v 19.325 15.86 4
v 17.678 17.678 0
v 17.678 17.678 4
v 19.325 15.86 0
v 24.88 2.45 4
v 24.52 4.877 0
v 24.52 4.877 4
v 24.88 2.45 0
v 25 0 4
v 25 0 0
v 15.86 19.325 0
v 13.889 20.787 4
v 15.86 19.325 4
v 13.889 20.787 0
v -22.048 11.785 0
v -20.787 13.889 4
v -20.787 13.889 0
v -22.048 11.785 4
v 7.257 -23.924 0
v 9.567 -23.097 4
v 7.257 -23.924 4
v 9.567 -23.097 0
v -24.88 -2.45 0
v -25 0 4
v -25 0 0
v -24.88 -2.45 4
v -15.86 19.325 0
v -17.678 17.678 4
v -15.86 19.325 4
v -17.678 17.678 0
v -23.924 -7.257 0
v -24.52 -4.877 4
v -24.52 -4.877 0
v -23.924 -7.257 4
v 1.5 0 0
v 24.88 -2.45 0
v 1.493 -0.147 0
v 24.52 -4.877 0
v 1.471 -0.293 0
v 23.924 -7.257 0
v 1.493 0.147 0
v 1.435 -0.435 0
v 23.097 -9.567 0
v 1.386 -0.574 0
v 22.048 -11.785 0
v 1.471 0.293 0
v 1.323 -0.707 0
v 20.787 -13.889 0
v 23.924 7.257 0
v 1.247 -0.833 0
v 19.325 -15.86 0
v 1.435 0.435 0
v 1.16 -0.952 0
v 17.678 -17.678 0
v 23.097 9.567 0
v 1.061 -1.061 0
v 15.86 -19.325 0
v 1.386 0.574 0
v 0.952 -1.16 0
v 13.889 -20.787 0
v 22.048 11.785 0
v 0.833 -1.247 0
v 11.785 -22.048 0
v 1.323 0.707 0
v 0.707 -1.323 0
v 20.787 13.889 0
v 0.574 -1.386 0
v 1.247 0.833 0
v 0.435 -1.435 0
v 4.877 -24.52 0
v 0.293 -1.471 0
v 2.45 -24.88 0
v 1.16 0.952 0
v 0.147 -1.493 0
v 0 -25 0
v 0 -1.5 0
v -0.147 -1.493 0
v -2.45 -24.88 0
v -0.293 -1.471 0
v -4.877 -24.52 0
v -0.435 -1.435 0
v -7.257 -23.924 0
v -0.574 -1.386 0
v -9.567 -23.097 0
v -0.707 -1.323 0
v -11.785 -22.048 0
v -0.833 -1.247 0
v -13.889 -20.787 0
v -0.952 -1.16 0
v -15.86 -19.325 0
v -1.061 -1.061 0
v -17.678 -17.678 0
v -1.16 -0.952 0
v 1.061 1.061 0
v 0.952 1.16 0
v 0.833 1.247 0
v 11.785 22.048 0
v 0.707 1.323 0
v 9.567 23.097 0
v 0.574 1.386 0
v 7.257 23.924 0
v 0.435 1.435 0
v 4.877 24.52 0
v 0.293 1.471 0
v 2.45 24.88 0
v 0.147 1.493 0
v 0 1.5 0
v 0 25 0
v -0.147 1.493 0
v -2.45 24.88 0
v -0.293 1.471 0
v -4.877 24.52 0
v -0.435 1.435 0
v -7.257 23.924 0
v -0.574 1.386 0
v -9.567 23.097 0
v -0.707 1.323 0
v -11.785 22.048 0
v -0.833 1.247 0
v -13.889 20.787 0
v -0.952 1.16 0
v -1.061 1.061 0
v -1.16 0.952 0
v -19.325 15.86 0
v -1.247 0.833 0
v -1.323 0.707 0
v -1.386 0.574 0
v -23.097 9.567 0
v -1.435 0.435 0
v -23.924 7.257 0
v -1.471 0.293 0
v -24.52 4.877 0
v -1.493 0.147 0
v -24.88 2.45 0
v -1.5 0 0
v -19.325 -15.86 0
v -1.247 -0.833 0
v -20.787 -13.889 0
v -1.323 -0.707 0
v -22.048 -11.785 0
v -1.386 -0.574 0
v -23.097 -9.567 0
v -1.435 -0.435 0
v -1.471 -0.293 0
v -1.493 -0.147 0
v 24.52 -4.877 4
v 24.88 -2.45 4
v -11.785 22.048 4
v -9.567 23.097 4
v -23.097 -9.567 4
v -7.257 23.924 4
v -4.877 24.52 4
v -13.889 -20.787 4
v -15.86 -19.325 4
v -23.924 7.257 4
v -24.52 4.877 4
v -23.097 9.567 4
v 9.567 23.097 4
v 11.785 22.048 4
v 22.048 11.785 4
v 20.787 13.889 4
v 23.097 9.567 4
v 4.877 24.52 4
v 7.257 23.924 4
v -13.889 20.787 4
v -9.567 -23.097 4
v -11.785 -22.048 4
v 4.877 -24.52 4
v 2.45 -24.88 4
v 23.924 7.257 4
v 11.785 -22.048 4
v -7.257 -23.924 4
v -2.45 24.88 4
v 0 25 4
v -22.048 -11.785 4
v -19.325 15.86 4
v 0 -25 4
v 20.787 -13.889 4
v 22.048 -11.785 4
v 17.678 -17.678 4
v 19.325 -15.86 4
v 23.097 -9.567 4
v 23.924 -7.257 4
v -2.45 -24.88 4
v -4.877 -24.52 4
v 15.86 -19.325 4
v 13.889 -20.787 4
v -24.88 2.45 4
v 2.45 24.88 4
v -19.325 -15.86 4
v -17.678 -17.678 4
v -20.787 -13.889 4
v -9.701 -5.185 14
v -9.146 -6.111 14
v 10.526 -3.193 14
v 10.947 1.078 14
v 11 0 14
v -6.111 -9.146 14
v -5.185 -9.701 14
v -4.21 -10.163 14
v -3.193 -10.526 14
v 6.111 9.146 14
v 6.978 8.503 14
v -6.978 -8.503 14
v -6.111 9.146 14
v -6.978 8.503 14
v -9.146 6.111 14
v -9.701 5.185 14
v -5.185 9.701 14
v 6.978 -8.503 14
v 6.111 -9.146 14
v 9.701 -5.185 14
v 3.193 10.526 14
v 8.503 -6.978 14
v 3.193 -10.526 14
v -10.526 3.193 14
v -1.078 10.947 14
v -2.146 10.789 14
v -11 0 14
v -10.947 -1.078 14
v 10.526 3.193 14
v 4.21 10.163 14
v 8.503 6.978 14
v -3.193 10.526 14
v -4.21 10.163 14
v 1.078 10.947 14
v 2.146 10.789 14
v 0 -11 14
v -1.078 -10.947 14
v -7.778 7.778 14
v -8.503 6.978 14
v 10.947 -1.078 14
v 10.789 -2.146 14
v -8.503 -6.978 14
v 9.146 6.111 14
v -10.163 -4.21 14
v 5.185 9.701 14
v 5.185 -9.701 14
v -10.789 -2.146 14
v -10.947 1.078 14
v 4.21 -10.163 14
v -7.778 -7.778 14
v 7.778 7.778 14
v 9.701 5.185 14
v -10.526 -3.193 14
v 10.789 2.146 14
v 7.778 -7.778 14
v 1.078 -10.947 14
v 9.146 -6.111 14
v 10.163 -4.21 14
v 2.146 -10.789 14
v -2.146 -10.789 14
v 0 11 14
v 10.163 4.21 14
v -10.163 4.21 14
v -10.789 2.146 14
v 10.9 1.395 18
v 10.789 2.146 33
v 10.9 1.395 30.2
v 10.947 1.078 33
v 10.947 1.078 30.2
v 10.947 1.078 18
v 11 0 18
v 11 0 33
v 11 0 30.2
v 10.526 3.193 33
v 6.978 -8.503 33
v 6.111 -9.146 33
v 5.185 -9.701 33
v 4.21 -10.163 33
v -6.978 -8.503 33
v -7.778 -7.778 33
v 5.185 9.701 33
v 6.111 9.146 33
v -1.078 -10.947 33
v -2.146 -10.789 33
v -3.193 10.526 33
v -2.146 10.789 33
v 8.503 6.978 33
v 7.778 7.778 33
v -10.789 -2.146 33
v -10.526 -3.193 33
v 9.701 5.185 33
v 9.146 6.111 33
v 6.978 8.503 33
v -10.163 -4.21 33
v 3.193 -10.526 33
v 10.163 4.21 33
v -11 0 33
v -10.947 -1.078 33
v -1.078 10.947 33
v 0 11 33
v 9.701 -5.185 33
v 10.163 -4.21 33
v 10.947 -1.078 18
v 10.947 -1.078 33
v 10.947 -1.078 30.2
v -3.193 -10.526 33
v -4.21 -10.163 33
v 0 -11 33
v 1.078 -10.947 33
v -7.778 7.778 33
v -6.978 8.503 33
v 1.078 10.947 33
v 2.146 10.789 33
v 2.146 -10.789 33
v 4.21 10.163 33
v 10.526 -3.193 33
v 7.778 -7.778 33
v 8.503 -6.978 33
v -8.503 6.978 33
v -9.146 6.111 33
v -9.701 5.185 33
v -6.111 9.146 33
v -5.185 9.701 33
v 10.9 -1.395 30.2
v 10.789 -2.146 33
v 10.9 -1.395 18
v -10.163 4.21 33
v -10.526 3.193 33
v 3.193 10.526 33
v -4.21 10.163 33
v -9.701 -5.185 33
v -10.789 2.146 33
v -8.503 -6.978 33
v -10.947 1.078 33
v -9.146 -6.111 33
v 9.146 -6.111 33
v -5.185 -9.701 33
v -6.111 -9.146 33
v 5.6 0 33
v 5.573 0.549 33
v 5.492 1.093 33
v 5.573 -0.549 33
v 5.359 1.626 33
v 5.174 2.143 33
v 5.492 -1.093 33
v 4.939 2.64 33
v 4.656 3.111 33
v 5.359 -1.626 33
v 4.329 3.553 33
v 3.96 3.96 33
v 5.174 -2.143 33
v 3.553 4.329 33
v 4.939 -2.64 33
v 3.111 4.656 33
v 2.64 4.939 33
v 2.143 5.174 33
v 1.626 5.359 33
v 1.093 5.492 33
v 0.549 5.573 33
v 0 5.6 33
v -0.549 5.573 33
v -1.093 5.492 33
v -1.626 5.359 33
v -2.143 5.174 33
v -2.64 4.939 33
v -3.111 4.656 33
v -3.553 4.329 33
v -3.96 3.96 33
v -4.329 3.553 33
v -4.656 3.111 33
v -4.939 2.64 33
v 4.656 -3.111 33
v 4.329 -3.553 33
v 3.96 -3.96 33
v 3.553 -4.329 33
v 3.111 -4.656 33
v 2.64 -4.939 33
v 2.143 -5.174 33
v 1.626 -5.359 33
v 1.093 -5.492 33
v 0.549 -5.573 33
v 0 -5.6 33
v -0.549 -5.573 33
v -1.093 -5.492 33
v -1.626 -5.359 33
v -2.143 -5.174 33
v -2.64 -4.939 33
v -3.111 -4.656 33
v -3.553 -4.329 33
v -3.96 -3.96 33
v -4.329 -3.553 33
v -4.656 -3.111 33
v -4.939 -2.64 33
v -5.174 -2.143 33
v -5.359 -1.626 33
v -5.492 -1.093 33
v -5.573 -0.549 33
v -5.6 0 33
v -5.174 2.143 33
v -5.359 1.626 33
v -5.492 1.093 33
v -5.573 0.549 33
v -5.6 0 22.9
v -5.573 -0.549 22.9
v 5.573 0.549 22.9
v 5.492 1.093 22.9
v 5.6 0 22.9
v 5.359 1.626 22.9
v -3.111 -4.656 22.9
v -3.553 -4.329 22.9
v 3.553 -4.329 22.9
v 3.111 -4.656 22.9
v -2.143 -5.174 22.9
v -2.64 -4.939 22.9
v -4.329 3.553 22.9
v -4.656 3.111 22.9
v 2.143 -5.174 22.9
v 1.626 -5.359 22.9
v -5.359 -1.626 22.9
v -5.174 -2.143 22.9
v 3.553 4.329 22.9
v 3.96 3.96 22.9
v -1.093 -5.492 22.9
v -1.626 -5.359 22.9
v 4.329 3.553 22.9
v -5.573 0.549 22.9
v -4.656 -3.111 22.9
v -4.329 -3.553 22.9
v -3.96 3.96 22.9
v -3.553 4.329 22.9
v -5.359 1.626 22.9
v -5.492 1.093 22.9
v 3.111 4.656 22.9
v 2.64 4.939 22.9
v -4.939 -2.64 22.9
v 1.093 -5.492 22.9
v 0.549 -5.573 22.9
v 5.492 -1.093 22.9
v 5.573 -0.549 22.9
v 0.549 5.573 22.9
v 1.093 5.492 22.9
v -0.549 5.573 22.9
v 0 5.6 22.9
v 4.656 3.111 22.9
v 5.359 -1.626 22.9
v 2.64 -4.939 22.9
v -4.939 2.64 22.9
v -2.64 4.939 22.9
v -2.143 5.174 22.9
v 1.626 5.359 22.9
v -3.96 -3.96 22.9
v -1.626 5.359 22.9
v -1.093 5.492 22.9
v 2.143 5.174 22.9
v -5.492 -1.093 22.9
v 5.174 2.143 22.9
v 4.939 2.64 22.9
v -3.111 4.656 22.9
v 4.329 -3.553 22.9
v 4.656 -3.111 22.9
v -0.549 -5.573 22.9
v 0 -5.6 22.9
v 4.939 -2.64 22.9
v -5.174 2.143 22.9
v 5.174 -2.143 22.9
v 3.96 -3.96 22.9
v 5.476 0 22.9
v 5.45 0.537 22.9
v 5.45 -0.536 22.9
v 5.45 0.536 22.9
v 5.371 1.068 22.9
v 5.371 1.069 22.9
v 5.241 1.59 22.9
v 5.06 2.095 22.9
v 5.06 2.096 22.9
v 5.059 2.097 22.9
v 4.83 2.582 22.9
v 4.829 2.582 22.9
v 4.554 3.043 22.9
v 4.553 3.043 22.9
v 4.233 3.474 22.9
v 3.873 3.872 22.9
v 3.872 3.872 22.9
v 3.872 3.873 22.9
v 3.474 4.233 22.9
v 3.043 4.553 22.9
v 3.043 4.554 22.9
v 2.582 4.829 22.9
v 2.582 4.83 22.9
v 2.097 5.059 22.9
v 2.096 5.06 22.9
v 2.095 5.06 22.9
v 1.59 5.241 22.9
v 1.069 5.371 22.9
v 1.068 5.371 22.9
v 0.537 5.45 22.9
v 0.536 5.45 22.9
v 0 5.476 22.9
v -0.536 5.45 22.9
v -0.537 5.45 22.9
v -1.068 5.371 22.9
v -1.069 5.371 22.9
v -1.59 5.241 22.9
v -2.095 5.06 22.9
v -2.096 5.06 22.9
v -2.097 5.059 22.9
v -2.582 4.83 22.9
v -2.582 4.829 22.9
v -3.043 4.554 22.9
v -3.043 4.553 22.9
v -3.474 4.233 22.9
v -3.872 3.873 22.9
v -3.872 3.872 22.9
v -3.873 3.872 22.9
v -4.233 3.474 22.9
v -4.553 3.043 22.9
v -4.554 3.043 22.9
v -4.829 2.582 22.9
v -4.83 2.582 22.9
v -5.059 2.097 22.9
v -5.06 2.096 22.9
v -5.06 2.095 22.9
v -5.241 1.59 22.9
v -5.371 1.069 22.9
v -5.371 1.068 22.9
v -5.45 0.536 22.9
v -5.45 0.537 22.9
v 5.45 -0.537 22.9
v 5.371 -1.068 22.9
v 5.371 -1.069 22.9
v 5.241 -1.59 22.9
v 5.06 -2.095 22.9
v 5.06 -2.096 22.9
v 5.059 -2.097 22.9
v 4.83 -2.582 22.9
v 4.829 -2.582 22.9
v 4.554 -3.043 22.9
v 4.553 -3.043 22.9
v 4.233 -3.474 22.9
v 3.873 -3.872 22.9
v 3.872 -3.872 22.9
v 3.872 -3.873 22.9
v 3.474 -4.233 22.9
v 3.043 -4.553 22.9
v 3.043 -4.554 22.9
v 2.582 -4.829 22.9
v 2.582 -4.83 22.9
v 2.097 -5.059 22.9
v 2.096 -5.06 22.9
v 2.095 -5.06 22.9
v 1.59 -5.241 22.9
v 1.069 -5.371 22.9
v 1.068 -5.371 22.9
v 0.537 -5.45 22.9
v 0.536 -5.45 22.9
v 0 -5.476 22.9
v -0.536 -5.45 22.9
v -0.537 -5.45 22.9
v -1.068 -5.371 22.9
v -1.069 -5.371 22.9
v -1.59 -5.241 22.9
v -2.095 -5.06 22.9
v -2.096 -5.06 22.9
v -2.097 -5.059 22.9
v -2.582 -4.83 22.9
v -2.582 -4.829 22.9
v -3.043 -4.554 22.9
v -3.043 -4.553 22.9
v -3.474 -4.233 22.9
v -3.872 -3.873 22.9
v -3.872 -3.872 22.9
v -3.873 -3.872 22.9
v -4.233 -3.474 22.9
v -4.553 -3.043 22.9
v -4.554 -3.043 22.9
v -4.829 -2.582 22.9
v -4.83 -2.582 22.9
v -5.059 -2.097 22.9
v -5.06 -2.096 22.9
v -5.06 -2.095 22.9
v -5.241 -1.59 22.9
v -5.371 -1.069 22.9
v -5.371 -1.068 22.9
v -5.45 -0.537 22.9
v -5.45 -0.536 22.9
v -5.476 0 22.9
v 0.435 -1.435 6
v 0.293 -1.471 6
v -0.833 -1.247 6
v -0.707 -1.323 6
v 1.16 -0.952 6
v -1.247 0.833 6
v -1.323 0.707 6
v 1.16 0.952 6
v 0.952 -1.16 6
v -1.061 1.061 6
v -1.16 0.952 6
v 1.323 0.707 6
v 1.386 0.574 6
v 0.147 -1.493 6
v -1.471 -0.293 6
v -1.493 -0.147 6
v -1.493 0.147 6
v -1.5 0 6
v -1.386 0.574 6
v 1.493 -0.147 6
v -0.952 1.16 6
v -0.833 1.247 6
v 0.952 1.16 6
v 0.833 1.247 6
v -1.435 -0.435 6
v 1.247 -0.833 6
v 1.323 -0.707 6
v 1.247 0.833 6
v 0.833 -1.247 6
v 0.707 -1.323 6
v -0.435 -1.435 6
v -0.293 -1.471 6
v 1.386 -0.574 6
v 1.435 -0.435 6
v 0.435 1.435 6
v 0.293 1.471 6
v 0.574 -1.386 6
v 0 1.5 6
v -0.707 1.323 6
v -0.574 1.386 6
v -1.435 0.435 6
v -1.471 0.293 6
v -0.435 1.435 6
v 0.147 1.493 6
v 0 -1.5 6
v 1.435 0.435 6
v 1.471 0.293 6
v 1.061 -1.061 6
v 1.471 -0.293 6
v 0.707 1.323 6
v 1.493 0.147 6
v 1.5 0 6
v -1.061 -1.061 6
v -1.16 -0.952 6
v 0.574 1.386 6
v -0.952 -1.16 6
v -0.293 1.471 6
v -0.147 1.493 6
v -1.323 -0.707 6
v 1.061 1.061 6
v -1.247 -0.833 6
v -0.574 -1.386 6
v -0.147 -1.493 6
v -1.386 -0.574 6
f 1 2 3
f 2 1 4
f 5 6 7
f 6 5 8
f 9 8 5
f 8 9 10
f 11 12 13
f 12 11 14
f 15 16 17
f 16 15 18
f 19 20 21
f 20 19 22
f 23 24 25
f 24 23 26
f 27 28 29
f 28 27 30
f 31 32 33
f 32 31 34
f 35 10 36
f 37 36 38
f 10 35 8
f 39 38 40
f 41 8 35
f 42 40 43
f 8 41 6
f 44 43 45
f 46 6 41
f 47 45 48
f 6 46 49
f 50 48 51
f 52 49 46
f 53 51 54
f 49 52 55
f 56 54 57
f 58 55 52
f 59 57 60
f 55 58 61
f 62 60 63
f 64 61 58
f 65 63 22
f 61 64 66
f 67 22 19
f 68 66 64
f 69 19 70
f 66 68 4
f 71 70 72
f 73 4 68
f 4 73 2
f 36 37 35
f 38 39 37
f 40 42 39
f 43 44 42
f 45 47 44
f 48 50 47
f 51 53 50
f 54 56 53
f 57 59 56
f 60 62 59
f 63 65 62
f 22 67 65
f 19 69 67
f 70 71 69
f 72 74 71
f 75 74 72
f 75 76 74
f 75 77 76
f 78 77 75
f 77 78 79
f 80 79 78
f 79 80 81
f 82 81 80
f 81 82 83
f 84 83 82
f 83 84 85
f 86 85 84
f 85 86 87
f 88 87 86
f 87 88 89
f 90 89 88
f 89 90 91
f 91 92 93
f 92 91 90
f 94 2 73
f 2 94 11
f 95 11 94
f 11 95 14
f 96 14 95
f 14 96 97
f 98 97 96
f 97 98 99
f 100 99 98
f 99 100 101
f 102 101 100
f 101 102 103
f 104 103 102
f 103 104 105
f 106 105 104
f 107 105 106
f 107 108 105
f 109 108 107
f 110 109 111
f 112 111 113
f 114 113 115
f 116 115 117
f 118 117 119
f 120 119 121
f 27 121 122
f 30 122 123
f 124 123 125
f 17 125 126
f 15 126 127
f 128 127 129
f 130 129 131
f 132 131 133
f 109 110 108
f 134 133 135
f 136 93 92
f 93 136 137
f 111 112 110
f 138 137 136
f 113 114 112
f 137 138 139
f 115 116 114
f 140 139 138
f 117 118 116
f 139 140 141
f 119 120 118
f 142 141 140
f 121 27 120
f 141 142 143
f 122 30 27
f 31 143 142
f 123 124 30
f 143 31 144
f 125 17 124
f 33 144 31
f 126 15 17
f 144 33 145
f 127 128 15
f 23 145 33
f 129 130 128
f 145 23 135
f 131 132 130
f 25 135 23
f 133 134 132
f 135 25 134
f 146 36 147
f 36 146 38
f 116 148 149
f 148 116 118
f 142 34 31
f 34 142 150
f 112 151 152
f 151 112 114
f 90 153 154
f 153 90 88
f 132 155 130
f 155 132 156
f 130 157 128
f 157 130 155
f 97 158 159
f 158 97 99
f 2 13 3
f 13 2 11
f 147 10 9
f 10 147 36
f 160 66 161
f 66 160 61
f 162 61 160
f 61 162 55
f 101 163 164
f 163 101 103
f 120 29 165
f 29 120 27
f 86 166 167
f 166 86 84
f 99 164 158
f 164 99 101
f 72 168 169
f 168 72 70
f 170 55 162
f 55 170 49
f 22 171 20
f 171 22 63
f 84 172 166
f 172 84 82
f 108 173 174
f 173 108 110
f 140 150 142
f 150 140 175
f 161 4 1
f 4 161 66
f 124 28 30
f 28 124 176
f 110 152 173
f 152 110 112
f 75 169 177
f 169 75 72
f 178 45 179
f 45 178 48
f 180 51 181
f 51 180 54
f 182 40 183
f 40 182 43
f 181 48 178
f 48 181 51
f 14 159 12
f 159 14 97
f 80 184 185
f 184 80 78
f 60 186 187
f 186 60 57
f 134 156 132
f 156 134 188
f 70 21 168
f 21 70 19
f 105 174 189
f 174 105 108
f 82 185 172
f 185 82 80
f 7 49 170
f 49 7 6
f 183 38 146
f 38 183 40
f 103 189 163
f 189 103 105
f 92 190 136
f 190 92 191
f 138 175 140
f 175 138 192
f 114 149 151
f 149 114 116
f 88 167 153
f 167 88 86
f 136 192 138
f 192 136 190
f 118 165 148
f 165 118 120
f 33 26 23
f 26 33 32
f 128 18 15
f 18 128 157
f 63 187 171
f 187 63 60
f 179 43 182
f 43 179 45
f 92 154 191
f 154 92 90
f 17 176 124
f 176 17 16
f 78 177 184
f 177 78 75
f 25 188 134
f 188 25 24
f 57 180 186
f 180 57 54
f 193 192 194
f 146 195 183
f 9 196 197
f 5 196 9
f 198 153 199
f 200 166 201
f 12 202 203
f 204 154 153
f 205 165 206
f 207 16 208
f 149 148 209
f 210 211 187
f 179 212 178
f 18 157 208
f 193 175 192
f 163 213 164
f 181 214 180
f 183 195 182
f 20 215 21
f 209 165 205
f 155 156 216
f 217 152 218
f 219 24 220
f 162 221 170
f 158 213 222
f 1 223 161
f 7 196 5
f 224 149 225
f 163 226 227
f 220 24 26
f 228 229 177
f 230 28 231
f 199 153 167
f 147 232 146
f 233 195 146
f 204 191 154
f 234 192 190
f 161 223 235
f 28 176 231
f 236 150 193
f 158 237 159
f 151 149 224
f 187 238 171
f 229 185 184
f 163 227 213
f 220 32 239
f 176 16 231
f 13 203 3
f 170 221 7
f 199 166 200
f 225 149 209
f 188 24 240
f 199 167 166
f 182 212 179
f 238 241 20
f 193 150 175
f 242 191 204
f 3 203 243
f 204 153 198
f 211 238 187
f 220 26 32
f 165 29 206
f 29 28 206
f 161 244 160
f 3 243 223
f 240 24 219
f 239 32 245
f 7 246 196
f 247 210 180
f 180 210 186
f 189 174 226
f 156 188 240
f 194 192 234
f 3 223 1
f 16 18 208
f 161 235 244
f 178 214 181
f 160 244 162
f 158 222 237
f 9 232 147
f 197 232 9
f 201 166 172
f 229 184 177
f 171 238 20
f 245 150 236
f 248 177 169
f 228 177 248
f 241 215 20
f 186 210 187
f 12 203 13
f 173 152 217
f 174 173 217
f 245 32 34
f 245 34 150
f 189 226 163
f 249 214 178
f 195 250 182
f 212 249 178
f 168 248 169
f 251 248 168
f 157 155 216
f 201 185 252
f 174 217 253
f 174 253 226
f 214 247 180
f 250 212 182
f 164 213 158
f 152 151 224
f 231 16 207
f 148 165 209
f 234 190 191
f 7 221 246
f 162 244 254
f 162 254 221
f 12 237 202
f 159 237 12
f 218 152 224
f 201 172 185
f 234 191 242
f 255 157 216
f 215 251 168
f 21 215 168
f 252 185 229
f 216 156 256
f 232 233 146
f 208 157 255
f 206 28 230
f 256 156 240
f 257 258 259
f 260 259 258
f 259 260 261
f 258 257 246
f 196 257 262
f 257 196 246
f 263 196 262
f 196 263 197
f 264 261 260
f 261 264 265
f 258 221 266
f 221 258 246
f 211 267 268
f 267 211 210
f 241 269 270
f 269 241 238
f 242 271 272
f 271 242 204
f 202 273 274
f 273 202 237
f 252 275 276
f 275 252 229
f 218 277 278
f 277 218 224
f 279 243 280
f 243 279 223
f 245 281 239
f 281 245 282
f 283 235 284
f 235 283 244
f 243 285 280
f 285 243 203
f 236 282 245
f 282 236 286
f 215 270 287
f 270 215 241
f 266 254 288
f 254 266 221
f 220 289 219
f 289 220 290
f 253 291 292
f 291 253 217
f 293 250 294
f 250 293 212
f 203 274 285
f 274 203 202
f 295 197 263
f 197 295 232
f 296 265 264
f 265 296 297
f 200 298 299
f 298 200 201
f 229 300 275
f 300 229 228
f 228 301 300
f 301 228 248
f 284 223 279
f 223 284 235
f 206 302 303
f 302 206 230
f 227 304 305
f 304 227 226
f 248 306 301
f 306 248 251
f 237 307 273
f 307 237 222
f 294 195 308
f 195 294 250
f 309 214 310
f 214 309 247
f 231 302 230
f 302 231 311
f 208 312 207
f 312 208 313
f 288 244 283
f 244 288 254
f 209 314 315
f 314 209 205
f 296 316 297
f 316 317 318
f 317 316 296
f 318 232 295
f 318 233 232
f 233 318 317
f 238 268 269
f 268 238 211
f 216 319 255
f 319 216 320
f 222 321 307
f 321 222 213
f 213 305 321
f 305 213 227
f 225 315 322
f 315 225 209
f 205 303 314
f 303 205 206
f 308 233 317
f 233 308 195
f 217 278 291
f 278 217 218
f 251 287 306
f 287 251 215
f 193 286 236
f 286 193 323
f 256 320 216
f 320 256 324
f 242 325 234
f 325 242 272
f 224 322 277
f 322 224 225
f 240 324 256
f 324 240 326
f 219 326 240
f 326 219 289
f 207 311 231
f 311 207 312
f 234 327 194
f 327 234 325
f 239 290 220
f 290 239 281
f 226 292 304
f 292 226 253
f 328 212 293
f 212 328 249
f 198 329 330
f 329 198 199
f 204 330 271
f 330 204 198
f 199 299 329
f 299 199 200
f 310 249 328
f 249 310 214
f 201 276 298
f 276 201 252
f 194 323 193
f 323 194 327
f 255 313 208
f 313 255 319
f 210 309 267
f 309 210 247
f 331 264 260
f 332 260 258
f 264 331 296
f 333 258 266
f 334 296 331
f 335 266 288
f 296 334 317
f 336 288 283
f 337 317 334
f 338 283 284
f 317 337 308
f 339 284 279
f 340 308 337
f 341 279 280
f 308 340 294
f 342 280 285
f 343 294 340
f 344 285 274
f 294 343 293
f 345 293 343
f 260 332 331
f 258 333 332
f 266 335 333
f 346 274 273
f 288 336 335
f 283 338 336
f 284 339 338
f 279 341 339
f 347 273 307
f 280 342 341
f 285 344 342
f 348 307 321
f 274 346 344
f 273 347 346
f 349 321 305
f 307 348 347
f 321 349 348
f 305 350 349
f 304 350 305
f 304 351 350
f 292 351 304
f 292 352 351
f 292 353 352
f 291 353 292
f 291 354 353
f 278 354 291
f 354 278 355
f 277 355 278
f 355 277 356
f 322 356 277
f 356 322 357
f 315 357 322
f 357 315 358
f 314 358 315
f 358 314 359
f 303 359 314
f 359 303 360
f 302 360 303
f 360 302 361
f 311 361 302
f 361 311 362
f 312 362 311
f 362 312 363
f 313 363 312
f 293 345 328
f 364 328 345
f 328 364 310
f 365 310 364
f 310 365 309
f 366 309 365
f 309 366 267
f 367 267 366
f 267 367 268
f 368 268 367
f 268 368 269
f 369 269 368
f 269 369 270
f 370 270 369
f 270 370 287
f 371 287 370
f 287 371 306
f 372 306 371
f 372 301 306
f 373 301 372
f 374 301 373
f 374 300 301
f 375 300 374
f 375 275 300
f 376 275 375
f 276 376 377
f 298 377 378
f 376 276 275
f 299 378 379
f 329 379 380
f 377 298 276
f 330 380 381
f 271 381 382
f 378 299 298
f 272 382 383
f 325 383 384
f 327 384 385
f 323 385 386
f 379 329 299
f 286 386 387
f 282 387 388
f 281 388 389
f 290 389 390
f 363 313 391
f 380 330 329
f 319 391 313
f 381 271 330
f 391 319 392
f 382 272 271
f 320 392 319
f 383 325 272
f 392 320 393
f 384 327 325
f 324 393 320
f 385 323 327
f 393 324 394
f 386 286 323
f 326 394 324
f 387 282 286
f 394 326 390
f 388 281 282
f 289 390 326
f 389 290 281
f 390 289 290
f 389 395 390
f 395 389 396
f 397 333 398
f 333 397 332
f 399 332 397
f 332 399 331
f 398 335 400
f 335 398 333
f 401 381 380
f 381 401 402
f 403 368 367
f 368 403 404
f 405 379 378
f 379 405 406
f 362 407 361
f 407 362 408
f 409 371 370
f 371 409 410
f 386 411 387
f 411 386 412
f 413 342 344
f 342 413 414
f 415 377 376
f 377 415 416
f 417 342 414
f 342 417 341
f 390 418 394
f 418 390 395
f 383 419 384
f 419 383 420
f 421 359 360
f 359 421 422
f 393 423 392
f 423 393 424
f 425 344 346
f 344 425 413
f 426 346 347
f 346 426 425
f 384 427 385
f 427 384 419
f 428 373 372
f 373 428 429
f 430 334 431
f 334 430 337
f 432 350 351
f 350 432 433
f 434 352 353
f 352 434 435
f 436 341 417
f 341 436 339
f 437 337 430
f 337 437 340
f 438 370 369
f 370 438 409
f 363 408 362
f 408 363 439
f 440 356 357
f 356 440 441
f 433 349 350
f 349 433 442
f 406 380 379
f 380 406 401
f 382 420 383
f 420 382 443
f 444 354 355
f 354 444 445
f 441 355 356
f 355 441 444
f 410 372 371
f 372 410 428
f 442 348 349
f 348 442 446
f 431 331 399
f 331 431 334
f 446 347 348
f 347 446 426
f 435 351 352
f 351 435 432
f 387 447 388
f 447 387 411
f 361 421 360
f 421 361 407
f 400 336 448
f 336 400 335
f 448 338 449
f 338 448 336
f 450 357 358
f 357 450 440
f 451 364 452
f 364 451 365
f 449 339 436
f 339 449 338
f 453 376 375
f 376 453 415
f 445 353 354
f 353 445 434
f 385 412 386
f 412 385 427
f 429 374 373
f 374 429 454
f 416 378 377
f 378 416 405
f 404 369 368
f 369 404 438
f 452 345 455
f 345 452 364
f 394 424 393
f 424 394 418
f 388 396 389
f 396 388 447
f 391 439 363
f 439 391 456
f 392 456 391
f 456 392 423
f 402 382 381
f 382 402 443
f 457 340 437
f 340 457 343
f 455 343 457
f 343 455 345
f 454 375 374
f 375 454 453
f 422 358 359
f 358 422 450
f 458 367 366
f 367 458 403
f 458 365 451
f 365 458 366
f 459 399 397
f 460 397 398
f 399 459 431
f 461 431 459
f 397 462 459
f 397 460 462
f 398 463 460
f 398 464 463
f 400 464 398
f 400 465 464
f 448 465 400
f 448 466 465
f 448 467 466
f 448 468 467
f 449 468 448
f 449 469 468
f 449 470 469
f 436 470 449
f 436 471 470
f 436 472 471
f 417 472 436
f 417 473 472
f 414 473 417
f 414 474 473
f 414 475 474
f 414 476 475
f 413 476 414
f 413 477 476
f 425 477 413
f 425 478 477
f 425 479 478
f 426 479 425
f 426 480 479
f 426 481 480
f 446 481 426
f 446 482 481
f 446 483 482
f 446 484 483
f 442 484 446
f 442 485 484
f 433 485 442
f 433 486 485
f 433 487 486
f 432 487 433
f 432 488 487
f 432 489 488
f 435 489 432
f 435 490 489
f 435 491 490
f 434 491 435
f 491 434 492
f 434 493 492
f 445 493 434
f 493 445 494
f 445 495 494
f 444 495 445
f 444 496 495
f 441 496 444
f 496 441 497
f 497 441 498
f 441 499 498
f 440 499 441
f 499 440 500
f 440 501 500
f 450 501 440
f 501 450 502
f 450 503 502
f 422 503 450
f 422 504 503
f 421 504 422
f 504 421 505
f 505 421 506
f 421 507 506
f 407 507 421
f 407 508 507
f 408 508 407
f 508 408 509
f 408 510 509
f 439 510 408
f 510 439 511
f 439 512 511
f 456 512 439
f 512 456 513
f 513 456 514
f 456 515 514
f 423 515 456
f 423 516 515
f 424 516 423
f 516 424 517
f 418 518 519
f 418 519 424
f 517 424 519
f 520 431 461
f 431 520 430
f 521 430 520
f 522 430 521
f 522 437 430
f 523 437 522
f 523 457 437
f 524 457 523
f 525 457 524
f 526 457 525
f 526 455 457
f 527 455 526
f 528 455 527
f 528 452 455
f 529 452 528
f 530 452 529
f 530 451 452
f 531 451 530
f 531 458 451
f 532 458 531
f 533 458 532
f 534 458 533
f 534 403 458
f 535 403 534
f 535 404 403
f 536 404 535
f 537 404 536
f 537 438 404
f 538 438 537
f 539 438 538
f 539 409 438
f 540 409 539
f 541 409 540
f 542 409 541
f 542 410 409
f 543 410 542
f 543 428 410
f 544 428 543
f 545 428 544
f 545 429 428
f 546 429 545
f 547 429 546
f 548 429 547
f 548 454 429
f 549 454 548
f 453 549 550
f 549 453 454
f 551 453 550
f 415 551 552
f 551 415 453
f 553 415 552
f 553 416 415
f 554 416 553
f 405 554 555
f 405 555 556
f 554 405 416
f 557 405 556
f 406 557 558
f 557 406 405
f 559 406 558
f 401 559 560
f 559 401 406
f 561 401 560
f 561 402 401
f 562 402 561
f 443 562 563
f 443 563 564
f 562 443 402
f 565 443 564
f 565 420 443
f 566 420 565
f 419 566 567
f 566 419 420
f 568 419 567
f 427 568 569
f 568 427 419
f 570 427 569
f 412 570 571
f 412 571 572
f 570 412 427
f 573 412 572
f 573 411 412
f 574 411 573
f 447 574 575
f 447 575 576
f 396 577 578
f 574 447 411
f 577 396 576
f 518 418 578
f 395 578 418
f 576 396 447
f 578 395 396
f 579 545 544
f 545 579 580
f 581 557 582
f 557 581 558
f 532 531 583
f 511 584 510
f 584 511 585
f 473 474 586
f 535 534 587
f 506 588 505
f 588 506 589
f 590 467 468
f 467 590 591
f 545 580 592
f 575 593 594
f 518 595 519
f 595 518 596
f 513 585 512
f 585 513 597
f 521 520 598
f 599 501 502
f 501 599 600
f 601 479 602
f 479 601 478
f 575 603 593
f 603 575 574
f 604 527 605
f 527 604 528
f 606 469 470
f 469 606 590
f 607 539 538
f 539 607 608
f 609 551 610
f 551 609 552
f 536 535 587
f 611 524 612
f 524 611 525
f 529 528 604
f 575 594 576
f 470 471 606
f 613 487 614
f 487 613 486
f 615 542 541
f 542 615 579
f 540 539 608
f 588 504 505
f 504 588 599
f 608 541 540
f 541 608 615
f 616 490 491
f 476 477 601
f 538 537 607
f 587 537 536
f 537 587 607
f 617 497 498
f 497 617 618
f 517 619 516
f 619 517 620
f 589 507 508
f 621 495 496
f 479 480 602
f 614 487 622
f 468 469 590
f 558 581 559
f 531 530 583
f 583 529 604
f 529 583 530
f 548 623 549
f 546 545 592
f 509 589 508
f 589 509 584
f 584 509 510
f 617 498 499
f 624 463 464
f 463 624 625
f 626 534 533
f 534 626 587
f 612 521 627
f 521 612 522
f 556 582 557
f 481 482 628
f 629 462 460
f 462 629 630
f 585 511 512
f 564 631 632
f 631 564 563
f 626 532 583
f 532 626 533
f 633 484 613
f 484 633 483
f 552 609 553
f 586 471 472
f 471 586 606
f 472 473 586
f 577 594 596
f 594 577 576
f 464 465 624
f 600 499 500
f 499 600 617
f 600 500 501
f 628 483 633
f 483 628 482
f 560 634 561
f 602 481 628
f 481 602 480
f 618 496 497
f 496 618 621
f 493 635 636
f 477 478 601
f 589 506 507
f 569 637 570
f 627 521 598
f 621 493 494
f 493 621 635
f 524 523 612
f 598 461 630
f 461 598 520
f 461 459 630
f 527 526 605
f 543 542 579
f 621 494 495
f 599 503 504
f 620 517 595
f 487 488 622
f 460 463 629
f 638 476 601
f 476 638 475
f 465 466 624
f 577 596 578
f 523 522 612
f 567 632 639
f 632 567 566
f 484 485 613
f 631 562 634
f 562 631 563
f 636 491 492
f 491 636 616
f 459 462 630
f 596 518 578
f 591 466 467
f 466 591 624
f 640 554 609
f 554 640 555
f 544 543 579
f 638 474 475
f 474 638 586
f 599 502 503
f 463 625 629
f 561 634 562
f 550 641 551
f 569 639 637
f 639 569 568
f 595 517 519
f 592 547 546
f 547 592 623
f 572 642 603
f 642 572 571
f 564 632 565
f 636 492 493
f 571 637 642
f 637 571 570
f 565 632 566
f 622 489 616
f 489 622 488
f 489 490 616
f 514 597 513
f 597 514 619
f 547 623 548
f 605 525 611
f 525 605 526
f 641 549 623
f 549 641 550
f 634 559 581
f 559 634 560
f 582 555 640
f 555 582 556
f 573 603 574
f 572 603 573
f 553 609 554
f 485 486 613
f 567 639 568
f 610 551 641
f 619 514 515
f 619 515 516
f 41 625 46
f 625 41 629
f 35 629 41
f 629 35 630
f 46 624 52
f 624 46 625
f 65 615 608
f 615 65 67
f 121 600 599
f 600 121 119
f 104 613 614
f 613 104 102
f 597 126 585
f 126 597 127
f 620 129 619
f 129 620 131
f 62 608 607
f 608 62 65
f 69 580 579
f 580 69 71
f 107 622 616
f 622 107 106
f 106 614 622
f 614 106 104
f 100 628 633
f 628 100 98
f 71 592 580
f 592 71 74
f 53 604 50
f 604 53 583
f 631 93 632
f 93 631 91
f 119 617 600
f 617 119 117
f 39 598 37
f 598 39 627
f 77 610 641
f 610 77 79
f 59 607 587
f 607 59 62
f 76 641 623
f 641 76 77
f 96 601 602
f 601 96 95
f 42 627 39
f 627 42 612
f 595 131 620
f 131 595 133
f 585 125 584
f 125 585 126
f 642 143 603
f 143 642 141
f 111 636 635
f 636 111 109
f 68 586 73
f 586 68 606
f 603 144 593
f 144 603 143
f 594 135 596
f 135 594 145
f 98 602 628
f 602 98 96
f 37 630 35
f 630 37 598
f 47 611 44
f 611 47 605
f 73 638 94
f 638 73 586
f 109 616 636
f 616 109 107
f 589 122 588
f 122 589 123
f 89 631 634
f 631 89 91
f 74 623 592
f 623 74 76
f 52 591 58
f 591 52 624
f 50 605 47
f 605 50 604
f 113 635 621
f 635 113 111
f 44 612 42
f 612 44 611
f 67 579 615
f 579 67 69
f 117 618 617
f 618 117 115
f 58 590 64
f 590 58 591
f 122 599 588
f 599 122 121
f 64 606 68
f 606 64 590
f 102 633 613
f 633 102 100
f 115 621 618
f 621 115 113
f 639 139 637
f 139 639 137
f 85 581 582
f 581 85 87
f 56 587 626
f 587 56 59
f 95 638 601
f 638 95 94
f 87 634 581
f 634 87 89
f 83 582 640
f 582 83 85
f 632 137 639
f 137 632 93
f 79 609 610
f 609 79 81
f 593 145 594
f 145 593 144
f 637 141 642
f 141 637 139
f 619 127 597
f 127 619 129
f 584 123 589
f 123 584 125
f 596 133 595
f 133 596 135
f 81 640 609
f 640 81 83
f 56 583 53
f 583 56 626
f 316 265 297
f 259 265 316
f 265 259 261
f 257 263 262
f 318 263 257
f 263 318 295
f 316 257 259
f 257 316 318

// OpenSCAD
// --- Dimensions ---
base_diameter = 50.0;      // Diameter of the base disc
base_height = 4.0;         // Height of the base disc
cone_bottom_dia = 50.0;    // Diameter at the bottom of the cone (z=4)
cone_top_dia = 22.0;       // Diameter at the top of the cone (z=14)
cone_height = 10.0;        // Height of the cone section (14 - 4)
column_diameter = 22.0;     // Diameter of the top column
column_height = 19.0;      // Height of the column (33 - 14)
total_height = 33.0;       // Total height of the object

tube_seat_dia = 11.0;      // Diameter of the cylindrical part of the seat
seat_cyl_depth = 10.0;     // Depth of the cylindrical seat (33 - 23)
seat_cone_top_dia = 11.0;  // Diameter at the top of the seat cone (z=23)
seat_cone_bottom_dia = 3.0; // Diameter at the bottom of the seat cone (z=6)
seat_cone_height = 17.0;   // Height of the seat cone (23 - 6)

window_width = 4.0;        // Width of the viewing window in Y direction
window_height = 12.0;      // Height of the window (30 - 18)
window_z_start = 18.0;     // Bottom Z of the window
window_z_end = 30.0;       // Top Z of the window

// --- Constants ---
$fn = 64;

// --- Main Construction ---

module stand_geometry() {
    union() {
        // 1. Base Disc
        cylinder(d = base_diameter, h = base_height);

        // 2. Conical Section
        translate([0, 0, base_height])
        cylinder(d1 = cone_bottom_dia, d2 = cone_top_dia, h = cone_height);

        // 3. Top Column
        translate([0, 0, base_height + cone_height])
        cylinder(d = column_diameter, h = column_height);
    }
}

module tube_seat_cutout() {
    // Seat Cylindrical part
    translate([0, 0, total_height - seat_cyl_depth - 0.1])
    cylinder(d = tube_seat_dia + 0.2, h = seat_cyl_depth + 0.2);

    // Seat Conical part
    // We use a hull of two cylinders to create the cone for the seat
    hull() {
        // Top of seat cone (z=23)
        translate([0, 0, total_height - seat_cyl_depth])
        cylinder(d = tube_seat_dia, h = 0.1);
        
        // Bottom of seat cone (z=6)
        translate([0, 0, 6])
        cylinder(d = seat_cone_bottom_dia, h = 0.1);
    }
    // Extend the cone downwards to ensure clean cut
    translate([0, 0, 0])
    cylinder(d = seat_cone_bottom_dia, h = 6.1);
}

module window_cutout() {
    // The window is cut on the +X side. 
    // We create a box that is wider than the column and centered on X.
    // The window is 4mm wide in Y, so Y goes from -2 to 2.
    translate([column_diameter/2 - 0.1, -window_width/2, window_z_start])
    cube([column_diameter, window_width, window_z_end - window_z_start + 0.2]);
}

// --- Final Assembly ---

difference() {
    // The solid body
    stand_geometry();

    // The tube seat (subtracted)
    tube_seat_cutout();

    // The viewing window (subtracted)
    window_cutout();
}
